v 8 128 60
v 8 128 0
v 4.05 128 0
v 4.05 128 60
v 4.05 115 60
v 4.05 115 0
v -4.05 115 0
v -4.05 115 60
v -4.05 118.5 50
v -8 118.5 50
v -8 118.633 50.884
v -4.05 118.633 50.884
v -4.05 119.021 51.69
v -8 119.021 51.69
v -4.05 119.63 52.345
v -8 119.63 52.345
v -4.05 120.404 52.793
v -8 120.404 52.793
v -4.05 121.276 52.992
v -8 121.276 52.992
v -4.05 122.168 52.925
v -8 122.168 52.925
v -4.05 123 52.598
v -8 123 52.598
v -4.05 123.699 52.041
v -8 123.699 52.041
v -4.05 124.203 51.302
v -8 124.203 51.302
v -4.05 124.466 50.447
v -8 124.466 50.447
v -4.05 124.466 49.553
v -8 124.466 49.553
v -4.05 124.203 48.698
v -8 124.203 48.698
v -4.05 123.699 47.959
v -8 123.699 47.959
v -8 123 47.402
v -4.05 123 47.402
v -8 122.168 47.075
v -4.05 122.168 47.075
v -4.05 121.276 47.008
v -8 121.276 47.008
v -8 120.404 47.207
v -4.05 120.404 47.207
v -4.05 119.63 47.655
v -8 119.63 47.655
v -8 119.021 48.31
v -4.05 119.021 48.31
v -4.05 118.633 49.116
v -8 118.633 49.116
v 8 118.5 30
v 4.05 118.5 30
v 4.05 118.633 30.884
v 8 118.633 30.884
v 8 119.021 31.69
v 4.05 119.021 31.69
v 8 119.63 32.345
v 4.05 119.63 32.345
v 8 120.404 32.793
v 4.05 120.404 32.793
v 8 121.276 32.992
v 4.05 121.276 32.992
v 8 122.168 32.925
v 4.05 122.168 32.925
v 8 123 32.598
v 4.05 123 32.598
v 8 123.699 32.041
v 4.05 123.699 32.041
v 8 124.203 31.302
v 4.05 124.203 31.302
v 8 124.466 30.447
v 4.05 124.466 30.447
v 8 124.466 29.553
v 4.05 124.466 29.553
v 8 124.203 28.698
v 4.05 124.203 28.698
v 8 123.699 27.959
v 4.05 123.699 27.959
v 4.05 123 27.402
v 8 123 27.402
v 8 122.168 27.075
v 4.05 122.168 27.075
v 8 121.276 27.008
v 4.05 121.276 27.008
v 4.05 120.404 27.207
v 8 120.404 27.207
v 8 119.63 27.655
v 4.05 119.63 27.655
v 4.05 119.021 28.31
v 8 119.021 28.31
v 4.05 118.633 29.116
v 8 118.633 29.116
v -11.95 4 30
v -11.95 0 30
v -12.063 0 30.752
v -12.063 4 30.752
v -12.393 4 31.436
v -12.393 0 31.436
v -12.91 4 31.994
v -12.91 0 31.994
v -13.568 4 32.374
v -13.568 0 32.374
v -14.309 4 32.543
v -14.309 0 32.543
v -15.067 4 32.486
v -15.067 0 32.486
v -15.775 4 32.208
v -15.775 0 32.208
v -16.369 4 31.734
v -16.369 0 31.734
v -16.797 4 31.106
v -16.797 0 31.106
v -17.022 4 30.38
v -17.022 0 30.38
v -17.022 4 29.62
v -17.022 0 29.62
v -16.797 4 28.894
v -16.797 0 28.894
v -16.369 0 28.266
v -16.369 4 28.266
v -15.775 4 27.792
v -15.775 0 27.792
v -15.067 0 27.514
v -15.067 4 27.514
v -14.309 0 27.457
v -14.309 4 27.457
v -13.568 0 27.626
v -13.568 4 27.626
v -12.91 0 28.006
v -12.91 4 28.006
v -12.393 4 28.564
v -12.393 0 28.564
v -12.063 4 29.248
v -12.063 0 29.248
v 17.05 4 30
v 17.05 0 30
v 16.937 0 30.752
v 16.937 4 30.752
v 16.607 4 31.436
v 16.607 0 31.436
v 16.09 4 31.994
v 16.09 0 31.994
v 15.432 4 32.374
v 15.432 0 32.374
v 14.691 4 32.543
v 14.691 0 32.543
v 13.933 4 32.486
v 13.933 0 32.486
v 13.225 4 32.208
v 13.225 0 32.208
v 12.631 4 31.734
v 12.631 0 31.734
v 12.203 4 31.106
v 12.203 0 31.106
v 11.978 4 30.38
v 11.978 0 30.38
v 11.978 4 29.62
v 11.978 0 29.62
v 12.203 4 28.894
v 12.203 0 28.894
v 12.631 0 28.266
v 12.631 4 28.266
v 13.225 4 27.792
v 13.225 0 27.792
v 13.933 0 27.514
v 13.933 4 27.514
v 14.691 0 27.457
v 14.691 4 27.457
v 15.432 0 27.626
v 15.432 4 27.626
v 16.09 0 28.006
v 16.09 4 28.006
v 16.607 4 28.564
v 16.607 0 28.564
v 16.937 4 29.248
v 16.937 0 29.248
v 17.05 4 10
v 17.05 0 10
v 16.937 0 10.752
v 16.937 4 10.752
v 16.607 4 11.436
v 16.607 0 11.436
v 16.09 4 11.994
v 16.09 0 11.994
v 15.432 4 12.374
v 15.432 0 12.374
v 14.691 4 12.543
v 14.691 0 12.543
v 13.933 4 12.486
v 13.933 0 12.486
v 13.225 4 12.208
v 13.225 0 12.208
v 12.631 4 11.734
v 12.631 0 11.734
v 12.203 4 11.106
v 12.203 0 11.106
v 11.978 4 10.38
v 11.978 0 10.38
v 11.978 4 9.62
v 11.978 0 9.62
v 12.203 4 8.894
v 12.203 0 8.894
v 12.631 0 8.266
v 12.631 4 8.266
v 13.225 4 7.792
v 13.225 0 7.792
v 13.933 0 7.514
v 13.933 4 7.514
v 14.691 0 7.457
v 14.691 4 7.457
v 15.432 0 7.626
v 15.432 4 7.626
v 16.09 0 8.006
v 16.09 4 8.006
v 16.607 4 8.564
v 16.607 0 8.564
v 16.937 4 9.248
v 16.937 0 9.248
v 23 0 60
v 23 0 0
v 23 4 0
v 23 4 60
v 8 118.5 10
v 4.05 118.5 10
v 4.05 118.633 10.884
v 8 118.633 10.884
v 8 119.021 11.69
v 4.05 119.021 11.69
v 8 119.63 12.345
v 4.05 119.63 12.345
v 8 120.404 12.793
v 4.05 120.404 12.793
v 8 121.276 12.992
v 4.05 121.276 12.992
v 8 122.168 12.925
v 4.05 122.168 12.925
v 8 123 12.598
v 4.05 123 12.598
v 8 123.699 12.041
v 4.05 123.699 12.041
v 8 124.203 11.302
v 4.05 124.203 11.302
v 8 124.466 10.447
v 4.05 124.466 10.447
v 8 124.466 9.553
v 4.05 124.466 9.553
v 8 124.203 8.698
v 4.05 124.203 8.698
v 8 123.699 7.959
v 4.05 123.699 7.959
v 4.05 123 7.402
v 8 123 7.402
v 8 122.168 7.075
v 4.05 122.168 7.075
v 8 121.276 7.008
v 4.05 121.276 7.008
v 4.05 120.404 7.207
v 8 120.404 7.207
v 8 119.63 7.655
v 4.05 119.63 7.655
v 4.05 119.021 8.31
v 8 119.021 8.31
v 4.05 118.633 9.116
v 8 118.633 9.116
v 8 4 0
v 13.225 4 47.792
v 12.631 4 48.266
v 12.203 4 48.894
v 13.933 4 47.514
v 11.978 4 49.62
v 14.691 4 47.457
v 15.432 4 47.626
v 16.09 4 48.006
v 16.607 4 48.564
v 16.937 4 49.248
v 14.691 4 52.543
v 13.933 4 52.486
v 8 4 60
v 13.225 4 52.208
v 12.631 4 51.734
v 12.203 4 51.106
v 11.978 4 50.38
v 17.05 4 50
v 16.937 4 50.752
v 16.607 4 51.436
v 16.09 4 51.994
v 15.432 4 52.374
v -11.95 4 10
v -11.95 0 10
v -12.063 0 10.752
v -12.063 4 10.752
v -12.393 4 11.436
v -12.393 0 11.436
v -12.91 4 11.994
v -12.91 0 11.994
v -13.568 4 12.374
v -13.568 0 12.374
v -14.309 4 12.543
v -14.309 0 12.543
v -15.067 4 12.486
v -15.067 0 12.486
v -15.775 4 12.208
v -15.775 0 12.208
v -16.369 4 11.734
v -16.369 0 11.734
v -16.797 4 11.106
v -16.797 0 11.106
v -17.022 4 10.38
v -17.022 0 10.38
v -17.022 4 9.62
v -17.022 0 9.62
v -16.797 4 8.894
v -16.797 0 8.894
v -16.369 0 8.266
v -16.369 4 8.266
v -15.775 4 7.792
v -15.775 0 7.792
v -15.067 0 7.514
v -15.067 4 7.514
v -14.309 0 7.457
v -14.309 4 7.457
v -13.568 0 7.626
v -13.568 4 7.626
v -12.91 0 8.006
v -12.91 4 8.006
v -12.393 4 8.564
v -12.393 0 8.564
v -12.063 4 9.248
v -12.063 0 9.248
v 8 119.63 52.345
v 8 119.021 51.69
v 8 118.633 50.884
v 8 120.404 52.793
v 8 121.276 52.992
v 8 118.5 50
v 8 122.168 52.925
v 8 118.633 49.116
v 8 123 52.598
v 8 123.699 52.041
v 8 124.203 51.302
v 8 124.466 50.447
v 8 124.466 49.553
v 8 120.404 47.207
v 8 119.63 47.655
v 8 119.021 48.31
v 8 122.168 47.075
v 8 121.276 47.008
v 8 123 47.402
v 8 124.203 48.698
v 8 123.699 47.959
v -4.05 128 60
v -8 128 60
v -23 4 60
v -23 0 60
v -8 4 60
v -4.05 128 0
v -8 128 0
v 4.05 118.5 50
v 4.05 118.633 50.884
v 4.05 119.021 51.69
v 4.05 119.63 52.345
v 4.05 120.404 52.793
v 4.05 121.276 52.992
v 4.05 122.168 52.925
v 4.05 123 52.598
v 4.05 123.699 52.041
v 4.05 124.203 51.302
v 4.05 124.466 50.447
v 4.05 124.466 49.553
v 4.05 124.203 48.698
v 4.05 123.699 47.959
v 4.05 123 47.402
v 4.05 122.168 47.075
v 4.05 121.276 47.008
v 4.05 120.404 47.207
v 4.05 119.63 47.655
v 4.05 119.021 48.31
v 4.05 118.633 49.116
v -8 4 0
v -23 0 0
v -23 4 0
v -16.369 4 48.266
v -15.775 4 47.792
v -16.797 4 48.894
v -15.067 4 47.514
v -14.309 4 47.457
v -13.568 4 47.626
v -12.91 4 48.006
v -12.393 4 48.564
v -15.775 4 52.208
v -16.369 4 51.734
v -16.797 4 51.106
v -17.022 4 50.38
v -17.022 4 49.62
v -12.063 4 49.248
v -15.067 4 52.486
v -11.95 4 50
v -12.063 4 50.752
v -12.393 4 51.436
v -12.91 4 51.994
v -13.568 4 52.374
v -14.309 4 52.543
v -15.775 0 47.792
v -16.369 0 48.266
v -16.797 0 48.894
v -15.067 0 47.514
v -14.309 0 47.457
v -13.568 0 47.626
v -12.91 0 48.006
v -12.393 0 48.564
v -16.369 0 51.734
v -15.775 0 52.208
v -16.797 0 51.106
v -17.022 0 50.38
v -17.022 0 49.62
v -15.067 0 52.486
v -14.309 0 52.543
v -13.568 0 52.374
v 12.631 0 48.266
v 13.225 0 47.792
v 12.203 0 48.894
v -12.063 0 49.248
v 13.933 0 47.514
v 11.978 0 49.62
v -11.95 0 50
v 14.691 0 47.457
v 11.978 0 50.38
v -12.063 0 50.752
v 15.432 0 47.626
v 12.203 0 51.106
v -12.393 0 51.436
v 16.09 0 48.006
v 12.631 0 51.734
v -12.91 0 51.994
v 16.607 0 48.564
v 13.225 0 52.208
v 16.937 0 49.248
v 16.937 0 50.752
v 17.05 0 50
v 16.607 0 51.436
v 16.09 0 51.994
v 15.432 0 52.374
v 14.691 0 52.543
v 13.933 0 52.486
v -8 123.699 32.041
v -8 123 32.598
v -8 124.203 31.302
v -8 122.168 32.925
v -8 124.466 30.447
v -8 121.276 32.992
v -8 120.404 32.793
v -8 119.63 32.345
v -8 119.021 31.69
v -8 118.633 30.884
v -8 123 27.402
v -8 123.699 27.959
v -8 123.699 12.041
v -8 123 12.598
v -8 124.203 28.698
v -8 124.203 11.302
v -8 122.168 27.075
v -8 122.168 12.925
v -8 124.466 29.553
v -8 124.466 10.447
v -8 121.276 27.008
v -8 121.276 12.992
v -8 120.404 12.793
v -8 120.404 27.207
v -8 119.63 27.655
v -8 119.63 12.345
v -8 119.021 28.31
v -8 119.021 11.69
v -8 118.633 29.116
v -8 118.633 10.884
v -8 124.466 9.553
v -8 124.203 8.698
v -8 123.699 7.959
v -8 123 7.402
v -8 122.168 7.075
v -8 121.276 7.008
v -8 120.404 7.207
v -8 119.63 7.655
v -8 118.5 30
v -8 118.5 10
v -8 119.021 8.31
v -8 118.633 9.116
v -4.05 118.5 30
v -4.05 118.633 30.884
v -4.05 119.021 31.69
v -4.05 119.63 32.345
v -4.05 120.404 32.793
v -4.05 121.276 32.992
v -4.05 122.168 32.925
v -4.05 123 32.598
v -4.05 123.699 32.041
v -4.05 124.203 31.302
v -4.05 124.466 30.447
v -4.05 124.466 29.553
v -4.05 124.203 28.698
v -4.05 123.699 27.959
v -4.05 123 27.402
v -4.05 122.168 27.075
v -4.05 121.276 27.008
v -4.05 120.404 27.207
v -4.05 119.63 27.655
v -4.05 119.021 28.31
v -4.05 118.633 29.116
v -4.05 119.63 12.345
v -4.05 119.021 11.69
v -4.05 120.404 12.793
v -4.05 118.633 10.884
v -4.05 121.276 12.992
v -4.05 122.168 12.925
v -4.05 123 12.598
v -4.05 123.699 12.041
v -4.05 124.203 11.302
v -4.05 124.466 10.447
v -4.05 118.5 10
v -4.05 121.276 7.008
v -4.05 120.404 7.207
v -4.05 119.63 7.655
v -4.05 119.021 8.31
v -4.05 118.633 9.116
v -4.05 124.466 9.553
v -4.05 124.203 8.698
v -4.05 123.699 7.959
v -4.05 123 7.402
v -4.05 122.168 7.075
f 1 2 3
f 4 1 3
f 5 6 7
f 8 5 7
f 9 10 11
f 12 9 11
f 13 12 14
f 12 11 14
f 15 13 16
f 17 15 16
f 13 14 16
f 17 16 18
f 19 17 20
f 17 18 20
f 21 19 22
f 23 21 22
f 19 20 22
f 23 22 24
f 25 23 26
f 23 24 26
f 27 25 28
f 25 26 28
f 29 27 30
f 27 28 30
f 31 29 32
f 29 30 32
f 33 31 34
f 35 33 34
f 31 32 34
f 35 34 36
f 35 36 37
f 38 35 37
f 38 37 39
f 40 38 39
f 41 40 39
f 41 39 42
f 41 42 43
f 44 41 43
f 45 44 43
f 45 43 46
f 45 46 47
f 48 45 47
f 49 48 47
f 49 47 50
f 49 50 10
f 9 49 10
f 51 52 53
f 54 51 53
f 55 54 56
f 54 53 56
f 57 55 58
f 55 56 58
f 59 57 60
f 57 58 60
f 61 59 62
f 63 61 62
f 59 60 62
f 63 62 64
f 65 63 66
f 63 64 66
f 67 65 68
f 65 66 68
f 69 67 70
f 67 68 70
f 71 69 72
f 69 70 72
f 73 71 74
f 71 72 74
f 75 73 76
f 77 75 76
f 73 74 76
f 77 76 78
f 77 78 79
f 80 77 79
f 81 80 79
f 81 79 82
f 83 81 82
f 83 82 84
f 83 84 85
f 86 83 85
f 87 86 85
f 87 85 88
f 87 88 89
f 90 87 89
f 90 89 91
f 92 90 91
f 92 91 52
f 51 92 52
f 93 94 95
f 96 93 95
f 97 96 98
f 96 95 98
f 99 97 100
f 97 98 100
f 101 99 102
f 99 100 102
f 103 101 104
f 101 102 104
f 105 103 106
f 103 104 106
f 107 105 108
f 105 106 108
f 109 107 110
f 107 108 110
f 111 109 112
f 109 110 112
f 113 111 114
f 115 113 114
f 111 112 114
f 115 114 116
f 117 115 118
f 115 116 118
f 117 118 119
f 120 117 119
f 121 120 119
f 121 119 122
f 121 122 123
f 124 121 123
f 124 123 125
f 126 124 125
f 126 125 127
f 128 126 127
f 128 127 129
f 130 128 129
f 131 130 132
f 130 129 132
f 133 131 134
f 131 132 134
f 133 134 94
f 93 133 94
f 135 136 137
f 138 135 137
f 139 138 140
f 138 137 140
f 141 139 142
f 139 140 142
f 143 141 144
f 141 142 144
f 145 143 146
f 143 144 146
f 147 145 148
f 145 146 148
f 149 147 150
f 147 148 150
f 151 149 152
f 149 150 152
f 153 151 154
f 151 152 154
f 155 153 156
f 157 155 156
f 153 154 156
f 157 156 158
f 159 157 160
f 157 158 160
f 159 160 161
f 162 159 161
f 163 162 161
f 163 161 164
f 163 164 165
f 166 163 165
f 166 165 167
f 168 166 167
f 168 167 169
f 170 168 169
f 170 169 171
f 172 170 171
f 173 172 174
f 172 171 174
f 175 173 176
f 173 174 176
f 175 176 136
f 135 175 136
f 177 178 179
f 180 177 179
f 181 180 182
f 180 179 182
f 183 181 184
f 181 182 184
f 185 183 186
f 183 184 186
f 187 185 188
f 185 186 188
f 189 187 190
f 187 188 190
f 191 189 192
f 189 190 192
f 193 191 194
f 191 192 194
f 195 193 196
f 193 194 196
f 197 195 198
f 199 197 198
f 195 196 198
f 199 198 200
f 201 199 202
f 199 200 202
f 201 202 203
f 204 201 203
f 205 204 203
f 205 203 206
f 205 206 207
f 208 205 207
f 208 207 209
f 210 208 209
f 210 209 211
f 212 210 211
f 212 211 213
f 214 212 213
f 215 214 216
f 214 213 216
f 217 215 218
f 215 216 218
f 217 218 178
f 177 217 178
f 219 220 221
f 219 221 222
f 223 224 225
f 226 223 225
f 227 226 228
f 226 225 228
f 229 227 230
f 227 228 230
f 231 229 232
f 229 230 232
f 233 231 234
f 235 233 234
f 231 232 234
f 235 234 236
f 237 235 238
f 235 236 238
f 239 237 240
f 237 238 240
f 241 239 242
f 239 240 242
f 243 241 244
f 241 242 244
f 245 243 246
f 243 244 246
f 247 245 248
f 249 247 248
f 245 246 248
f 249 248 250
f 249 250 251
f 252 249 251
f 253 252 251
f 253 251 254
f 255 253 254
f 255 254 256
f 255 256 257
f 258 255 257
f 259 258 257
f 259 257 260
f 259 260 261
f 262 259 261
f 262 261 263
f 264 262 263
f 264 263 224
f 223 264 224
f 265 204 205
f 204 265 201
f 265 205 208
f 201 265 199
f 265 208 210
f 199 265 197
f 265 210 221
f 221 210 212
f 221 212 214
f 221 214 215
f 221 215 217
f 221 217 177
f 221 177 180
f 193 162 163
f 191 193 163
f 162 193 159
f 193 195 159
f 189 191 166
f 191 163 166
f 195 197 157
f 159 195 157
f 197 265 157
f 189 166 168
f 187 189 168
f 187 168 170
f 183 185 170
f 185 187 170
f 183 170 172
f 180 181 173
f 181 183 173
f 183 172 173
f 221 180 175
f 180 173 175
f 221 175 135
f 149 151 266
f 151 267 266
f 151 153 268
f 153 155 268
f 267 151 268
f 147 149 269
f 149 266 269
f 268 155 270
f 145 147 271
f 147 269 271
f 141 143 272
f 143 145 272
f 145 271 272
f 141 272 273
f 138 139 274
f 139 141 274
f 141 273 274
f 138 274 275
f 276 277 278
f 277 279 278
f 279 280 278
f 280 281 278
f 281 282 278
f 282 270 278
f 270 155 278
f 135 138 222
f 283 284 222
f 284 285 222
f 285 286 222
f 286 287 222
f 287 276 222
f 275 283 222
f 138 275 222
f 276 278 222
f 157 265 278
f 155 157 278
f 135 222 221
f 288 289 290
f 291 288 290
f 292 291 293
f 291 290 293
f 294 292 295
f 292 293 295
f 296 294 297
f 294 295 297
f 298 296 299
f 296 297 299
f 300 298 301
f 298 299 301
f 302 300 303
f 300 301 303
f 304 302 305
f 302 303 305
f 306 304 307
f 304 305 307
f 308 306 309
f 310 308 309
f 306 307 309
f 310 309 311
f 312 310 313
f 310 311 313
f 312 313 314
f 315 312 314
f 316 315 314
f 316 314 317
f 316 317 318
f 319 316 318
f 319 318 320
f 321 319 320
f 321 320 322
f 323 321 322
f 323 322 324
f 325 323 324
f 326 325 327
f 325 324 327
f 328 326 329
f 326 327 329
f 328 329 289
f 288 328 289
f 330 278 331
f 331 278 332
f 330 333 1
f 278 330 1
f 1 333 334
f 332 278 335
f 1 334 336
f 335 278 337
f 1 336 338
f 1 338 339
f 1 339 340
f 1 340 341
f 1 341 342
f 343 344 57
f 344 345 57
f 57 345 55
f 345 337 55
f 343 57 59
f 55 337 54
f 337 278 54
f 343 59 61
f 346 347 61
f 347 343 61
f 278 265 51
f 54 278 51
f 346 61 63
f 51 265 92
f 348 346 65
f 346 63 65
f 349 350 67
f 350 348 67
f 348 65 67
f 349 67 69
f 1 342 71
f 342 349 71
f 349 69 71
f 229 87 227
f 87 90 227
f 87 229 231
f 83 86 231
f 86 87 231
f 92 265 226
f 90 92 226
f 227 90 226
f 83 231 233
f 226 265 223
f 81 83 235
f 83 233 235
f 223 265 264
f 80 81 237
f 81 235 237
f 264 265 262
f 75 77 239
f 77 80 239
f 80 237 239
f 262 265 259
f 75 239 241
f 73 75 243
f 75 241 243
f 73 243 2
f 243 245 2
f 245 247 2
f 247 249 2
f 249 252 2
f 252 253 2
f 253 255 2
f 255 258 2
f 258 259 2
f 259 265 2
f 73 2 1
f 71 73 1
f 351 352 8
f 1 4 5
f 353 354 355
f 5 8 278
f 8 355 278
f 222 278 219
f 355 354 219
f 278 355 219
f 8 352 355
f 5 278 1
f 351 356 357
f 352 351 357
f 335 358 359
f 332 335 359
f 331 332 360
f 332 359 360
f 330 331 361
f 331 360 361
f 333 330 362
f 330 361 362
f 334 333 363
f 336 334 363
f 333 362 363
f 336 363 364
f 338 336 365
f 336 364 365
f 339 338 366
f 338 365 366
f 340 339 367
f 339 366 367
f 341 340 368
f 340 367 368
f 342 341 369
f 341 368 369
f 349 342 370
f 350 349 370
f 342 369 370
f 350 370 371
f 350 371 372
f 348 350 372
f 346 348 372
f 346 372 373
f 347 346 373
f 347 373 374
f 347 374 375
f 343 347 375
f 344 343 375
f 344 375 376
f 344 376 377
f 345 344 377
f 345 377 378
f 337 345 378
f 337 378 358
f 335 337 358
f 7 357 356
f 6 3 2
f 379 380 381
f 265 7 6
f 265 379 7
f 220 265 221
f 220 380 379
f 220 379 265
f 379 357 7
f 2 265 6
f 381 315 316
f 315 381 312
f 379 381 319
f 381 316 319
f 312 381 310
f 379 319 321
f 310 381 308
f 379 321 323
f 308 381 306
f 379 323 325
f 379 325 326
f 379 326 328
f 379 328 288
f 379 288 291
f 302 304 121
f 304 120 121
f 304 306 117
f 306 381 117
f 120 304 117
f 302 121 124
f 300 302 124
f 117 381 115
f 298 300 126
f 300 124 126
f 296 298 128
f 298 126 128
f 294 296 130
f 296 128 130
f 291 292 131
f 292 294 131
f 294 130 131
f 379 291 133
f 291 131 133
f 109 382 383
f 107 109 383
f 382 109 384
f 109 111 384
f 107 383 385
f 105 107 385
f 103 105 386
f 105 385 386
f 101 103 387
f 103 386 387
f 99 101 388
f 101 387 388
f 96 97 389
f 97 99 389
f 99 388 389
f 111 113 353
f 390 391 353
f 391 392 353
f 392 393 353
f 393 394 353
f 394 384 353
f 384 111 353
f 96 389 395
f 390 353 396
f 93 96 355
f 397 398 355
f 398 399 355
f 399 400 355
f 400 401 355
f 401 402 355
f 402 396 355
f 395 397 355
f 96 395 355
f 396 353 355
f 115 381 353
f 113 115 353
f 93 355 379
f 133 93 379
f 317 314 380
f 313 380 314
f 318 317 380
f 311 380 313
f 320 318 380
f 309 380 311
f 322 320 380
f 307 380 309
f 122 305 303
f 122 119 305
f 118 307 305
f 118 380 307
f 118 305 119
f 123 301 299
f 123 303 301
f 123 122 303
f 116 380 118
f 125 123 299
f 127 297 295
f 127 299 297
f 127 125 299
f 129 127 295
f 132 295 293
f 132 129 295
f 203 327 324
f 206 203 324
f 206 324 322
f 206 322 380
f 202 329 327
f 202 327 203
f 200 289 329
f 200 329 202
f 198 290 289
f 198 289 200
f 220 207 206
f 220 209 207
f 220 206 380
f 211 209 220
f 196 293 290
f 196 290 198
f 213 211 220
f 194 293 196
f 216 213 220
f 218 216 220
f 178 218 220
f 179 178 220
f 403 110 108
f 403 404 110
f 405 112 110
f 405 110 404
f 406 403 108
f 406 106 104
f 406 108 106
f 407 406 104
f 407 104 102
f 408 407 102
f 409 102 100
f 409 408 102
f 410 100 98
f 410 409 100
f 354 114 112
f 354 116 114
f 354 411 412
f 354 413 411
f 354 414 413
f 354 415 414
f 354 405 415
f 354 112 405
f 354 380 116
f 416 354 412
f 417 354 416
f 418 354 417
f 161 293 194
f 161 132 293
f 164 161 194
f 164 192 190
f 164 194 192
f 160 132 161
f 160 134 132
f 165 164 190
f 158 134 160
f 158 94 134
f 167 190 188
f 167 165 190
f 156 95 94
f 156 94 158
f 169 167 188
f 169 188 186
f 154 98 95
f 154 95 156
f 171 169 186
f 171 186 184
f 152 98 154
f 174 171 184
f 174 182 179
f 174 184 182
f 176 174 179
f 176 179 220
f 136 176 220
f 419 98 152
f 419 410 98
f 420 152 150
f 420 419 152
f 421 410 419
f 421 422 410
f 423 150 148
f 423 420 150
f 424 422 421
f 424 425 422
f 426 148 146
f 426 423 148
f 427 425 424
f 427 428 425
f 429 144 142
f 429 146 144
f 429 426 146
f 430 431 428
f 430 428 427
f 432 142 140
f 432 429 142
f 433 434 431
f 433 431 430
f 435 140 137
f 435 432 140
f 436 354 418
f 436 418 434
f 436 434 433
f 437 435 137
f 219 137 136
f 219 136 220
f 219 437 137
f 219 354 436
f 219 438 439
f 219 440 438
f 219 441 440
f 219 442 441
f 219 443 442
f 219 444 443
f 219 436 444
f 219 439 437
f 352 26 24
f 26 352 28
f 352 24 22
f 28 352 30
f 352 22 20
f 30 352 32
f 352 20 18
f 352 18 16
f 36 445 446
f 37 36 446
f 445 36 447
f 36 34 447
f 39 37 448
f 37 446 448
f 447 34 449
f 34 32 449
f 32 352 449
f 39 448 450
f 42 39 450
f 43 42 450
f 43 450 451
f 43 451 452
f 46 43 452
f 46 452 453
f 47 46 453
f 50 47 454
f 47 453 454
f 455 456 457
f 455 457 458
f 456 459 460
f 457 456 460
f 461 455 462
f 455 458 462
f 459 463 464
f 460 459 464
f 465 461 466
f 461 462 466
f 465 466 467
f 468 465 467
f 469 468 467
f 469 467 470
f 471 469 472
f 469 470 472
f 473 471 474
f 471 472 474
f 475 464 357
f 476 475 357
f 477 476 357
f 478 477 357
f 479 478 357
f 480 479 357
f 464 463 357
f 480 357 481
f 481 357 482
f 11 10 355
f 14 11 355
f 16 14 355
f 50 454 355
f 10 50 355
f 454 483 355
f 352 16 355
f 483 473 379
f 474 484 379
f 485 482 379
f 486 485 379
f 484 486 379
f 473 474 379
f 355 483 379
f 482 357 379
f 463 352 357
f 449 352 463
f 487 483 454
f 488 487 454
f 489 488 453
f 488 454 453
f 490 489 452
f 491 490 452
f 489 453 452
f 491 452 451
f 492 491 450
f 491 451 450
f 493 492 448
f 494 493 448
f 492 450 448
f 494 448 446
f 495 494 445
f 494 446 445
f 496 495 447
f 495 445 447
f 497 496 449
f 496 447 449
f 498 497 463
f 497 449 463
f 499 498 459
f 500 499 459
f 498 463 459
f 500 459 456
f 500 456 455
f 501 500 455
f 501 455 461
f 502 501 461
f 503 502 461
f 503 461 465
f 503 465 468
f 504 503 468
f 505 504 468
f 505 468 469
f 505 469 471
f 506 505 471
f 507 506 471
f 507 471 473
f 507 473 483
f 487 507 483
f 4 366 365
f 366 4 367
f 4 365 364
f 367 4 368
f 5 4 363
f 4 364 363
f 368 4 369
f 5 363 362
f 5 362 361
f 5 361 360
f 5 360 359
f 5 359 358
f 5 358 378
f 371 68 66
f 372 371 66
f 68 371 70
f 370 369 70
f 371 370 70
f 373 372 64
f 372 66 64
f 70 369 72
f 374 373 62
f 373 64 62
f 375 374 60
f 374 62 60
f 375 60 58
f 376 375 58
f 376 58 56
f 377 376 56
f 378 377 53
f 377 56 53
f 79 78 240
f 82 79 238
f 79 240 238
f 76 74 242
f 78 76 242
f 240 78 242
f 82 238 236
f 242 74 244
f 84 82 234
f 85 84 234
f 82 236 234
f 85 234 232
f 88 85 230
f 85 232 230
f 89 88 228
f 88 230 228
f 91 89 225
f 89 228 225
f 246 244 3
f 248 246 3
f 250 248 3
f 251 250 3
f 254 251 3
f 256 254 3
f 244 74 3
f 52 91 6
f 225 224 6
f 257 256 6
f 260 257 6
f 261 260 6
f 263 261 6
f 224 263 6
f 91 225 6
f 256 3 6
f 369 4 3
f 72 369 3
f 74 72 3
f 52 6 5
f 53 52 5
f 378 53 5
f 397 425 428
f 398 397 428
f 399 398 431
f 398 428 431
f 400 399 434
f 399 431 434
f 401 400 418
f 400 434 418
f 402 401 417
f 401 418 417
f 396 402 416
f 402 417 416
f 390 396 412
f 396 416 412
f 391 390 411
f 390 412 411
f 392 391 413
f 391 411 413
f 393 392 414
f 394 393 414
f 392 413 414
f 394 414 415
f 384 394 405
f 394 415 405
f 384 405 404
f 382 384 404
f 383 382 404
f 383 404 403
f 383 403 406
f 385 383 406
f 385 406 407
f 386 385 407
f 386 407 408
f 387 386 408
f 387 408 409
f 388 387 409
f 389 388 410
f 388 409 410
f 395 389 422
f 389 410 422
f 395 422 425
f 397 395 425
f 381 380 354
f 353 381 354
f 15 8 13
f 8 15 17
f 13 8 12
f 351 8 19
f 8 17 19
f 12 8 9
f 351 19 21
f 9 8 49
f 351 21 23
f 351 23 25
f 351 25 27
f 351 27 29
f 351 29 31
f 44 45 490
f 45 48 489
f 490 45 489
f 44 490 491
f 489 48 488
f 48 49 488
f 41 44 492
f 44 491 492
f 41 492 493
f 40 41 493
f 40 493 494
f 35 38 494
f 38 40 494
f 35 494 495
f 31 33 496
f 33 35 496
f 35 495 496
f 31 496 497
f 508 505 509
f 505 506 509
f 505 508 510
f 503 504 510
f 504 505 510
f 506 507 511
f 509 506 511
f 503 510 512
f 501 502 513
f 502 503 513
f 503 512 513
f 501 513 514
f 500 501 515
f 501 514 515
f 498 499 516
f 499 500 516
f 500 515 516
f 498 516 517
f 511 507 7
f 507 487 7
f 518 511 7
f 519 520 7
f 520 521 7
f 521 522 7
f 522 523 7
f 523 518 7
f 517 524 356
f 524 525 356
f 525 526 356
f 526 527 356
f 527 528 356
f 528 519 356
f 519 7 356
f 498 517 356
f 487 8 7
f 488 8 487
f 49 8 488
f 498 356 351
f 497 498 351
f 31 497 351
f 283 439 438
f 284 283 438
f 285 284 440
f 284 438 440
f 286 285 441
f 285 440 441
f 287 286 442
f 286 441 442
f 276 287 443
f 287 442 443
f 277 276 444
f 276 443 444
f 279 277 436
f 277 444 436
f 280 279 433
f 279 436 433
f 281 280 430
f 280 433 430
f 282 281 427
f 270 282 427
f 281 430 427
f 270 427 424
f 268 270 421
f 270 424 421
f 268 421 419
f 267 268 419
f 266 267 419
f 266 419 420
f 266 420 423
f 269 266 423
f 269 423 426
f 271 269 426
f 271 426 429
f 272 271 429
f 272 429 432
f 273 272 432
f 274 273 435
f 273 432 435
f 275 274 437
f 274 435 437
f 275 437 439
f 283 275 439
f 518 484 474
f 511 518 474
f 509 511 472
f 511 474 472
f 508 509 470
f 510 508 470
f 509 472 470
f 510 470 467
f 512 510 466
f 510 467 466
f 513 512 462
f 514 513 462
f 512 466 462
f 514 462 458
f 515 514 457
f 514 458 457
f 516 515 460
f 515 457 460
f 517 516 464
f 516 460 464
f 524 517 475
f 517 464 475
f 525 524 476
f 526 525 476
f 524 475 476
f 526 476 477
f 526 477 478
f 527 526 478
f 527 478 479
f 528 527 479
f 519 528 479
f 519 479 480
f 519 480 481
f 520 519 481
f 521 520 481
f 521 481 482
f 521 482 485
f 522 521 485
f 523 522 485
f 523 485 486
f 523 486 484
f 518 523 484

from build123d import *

# Parameters (mm, degrees)
PAD_DEPTH    = 60
SKETCH001_R  = 3
HOLE_DEPTH   = 25
SKETCH002_W  = 46
SKETCH002_H  = 60
SKETCH002_R  = 2.55
PAD001_DEPTH = 4


with BuildPart() as part:
    # Sketch → Pad (new body)
    with BuildSketch(Plane.XY):
        Polygon((-8, 0), (8, 0), (8, 128), (4.05, 128), (4.05, 115), (-4.05, 115), (-4.05, 128), (-8, 128), align=None)
    extrude(amount=PAD_DEPTH)

    # Sketch001 (on Face8 of Pad) → Hole (cut)
    with BuildSketch(Plane(origin=(-8, 0, 0), x_dir=(0, -1, 0), z_dir=(-1, 0, 0))):
        with Locations((-121.5, 30)):
            Circle(SKETCH001_R)
        with Locations((-121.5, 10)):
            Circle(SKETCH001_R)
        with Locations((-121.5, 50)):
            Circle(SKETCH001_R)
    extrude(amount=-HOLE_DEPTH, mode=Mode.SUBTRACT)

    # Sketch002 (on Face1 of Hole) → Pad001 (join)
    with BuildSketch(Plane.XZ):
        with Locations((0, 30)):
            Rectangle(SKETCH002_W, SKETCH002_H)
        with Locations((-14.5, 30)):
            Circle(SKETCH002_R, mode=Mode.SUBTRACT)
        with Locations((-14.5, 10)):
            Circle(SKETCH002_R, mode=Mode.SUBTRACT)
        with Locations((14.5, 30)):
            Circle(SKETCH002_R, mode=Mode.SUBTRACT)
        with Locations((14.5, 10)):
            Circle(SKETCH002_R, mode=Mode.SUBTRACT)
        with Locations((-14.5, 50)):
            Circle(SKETCH002_R, mode=Mode.SUBTRACT)
        with Locations((14.5, 50)):
            Circle(SKETCH002_R, mode=Mode.SUBTRACT)
    extrude(amount=-PAD001_DEPTH)


solid = part.part
